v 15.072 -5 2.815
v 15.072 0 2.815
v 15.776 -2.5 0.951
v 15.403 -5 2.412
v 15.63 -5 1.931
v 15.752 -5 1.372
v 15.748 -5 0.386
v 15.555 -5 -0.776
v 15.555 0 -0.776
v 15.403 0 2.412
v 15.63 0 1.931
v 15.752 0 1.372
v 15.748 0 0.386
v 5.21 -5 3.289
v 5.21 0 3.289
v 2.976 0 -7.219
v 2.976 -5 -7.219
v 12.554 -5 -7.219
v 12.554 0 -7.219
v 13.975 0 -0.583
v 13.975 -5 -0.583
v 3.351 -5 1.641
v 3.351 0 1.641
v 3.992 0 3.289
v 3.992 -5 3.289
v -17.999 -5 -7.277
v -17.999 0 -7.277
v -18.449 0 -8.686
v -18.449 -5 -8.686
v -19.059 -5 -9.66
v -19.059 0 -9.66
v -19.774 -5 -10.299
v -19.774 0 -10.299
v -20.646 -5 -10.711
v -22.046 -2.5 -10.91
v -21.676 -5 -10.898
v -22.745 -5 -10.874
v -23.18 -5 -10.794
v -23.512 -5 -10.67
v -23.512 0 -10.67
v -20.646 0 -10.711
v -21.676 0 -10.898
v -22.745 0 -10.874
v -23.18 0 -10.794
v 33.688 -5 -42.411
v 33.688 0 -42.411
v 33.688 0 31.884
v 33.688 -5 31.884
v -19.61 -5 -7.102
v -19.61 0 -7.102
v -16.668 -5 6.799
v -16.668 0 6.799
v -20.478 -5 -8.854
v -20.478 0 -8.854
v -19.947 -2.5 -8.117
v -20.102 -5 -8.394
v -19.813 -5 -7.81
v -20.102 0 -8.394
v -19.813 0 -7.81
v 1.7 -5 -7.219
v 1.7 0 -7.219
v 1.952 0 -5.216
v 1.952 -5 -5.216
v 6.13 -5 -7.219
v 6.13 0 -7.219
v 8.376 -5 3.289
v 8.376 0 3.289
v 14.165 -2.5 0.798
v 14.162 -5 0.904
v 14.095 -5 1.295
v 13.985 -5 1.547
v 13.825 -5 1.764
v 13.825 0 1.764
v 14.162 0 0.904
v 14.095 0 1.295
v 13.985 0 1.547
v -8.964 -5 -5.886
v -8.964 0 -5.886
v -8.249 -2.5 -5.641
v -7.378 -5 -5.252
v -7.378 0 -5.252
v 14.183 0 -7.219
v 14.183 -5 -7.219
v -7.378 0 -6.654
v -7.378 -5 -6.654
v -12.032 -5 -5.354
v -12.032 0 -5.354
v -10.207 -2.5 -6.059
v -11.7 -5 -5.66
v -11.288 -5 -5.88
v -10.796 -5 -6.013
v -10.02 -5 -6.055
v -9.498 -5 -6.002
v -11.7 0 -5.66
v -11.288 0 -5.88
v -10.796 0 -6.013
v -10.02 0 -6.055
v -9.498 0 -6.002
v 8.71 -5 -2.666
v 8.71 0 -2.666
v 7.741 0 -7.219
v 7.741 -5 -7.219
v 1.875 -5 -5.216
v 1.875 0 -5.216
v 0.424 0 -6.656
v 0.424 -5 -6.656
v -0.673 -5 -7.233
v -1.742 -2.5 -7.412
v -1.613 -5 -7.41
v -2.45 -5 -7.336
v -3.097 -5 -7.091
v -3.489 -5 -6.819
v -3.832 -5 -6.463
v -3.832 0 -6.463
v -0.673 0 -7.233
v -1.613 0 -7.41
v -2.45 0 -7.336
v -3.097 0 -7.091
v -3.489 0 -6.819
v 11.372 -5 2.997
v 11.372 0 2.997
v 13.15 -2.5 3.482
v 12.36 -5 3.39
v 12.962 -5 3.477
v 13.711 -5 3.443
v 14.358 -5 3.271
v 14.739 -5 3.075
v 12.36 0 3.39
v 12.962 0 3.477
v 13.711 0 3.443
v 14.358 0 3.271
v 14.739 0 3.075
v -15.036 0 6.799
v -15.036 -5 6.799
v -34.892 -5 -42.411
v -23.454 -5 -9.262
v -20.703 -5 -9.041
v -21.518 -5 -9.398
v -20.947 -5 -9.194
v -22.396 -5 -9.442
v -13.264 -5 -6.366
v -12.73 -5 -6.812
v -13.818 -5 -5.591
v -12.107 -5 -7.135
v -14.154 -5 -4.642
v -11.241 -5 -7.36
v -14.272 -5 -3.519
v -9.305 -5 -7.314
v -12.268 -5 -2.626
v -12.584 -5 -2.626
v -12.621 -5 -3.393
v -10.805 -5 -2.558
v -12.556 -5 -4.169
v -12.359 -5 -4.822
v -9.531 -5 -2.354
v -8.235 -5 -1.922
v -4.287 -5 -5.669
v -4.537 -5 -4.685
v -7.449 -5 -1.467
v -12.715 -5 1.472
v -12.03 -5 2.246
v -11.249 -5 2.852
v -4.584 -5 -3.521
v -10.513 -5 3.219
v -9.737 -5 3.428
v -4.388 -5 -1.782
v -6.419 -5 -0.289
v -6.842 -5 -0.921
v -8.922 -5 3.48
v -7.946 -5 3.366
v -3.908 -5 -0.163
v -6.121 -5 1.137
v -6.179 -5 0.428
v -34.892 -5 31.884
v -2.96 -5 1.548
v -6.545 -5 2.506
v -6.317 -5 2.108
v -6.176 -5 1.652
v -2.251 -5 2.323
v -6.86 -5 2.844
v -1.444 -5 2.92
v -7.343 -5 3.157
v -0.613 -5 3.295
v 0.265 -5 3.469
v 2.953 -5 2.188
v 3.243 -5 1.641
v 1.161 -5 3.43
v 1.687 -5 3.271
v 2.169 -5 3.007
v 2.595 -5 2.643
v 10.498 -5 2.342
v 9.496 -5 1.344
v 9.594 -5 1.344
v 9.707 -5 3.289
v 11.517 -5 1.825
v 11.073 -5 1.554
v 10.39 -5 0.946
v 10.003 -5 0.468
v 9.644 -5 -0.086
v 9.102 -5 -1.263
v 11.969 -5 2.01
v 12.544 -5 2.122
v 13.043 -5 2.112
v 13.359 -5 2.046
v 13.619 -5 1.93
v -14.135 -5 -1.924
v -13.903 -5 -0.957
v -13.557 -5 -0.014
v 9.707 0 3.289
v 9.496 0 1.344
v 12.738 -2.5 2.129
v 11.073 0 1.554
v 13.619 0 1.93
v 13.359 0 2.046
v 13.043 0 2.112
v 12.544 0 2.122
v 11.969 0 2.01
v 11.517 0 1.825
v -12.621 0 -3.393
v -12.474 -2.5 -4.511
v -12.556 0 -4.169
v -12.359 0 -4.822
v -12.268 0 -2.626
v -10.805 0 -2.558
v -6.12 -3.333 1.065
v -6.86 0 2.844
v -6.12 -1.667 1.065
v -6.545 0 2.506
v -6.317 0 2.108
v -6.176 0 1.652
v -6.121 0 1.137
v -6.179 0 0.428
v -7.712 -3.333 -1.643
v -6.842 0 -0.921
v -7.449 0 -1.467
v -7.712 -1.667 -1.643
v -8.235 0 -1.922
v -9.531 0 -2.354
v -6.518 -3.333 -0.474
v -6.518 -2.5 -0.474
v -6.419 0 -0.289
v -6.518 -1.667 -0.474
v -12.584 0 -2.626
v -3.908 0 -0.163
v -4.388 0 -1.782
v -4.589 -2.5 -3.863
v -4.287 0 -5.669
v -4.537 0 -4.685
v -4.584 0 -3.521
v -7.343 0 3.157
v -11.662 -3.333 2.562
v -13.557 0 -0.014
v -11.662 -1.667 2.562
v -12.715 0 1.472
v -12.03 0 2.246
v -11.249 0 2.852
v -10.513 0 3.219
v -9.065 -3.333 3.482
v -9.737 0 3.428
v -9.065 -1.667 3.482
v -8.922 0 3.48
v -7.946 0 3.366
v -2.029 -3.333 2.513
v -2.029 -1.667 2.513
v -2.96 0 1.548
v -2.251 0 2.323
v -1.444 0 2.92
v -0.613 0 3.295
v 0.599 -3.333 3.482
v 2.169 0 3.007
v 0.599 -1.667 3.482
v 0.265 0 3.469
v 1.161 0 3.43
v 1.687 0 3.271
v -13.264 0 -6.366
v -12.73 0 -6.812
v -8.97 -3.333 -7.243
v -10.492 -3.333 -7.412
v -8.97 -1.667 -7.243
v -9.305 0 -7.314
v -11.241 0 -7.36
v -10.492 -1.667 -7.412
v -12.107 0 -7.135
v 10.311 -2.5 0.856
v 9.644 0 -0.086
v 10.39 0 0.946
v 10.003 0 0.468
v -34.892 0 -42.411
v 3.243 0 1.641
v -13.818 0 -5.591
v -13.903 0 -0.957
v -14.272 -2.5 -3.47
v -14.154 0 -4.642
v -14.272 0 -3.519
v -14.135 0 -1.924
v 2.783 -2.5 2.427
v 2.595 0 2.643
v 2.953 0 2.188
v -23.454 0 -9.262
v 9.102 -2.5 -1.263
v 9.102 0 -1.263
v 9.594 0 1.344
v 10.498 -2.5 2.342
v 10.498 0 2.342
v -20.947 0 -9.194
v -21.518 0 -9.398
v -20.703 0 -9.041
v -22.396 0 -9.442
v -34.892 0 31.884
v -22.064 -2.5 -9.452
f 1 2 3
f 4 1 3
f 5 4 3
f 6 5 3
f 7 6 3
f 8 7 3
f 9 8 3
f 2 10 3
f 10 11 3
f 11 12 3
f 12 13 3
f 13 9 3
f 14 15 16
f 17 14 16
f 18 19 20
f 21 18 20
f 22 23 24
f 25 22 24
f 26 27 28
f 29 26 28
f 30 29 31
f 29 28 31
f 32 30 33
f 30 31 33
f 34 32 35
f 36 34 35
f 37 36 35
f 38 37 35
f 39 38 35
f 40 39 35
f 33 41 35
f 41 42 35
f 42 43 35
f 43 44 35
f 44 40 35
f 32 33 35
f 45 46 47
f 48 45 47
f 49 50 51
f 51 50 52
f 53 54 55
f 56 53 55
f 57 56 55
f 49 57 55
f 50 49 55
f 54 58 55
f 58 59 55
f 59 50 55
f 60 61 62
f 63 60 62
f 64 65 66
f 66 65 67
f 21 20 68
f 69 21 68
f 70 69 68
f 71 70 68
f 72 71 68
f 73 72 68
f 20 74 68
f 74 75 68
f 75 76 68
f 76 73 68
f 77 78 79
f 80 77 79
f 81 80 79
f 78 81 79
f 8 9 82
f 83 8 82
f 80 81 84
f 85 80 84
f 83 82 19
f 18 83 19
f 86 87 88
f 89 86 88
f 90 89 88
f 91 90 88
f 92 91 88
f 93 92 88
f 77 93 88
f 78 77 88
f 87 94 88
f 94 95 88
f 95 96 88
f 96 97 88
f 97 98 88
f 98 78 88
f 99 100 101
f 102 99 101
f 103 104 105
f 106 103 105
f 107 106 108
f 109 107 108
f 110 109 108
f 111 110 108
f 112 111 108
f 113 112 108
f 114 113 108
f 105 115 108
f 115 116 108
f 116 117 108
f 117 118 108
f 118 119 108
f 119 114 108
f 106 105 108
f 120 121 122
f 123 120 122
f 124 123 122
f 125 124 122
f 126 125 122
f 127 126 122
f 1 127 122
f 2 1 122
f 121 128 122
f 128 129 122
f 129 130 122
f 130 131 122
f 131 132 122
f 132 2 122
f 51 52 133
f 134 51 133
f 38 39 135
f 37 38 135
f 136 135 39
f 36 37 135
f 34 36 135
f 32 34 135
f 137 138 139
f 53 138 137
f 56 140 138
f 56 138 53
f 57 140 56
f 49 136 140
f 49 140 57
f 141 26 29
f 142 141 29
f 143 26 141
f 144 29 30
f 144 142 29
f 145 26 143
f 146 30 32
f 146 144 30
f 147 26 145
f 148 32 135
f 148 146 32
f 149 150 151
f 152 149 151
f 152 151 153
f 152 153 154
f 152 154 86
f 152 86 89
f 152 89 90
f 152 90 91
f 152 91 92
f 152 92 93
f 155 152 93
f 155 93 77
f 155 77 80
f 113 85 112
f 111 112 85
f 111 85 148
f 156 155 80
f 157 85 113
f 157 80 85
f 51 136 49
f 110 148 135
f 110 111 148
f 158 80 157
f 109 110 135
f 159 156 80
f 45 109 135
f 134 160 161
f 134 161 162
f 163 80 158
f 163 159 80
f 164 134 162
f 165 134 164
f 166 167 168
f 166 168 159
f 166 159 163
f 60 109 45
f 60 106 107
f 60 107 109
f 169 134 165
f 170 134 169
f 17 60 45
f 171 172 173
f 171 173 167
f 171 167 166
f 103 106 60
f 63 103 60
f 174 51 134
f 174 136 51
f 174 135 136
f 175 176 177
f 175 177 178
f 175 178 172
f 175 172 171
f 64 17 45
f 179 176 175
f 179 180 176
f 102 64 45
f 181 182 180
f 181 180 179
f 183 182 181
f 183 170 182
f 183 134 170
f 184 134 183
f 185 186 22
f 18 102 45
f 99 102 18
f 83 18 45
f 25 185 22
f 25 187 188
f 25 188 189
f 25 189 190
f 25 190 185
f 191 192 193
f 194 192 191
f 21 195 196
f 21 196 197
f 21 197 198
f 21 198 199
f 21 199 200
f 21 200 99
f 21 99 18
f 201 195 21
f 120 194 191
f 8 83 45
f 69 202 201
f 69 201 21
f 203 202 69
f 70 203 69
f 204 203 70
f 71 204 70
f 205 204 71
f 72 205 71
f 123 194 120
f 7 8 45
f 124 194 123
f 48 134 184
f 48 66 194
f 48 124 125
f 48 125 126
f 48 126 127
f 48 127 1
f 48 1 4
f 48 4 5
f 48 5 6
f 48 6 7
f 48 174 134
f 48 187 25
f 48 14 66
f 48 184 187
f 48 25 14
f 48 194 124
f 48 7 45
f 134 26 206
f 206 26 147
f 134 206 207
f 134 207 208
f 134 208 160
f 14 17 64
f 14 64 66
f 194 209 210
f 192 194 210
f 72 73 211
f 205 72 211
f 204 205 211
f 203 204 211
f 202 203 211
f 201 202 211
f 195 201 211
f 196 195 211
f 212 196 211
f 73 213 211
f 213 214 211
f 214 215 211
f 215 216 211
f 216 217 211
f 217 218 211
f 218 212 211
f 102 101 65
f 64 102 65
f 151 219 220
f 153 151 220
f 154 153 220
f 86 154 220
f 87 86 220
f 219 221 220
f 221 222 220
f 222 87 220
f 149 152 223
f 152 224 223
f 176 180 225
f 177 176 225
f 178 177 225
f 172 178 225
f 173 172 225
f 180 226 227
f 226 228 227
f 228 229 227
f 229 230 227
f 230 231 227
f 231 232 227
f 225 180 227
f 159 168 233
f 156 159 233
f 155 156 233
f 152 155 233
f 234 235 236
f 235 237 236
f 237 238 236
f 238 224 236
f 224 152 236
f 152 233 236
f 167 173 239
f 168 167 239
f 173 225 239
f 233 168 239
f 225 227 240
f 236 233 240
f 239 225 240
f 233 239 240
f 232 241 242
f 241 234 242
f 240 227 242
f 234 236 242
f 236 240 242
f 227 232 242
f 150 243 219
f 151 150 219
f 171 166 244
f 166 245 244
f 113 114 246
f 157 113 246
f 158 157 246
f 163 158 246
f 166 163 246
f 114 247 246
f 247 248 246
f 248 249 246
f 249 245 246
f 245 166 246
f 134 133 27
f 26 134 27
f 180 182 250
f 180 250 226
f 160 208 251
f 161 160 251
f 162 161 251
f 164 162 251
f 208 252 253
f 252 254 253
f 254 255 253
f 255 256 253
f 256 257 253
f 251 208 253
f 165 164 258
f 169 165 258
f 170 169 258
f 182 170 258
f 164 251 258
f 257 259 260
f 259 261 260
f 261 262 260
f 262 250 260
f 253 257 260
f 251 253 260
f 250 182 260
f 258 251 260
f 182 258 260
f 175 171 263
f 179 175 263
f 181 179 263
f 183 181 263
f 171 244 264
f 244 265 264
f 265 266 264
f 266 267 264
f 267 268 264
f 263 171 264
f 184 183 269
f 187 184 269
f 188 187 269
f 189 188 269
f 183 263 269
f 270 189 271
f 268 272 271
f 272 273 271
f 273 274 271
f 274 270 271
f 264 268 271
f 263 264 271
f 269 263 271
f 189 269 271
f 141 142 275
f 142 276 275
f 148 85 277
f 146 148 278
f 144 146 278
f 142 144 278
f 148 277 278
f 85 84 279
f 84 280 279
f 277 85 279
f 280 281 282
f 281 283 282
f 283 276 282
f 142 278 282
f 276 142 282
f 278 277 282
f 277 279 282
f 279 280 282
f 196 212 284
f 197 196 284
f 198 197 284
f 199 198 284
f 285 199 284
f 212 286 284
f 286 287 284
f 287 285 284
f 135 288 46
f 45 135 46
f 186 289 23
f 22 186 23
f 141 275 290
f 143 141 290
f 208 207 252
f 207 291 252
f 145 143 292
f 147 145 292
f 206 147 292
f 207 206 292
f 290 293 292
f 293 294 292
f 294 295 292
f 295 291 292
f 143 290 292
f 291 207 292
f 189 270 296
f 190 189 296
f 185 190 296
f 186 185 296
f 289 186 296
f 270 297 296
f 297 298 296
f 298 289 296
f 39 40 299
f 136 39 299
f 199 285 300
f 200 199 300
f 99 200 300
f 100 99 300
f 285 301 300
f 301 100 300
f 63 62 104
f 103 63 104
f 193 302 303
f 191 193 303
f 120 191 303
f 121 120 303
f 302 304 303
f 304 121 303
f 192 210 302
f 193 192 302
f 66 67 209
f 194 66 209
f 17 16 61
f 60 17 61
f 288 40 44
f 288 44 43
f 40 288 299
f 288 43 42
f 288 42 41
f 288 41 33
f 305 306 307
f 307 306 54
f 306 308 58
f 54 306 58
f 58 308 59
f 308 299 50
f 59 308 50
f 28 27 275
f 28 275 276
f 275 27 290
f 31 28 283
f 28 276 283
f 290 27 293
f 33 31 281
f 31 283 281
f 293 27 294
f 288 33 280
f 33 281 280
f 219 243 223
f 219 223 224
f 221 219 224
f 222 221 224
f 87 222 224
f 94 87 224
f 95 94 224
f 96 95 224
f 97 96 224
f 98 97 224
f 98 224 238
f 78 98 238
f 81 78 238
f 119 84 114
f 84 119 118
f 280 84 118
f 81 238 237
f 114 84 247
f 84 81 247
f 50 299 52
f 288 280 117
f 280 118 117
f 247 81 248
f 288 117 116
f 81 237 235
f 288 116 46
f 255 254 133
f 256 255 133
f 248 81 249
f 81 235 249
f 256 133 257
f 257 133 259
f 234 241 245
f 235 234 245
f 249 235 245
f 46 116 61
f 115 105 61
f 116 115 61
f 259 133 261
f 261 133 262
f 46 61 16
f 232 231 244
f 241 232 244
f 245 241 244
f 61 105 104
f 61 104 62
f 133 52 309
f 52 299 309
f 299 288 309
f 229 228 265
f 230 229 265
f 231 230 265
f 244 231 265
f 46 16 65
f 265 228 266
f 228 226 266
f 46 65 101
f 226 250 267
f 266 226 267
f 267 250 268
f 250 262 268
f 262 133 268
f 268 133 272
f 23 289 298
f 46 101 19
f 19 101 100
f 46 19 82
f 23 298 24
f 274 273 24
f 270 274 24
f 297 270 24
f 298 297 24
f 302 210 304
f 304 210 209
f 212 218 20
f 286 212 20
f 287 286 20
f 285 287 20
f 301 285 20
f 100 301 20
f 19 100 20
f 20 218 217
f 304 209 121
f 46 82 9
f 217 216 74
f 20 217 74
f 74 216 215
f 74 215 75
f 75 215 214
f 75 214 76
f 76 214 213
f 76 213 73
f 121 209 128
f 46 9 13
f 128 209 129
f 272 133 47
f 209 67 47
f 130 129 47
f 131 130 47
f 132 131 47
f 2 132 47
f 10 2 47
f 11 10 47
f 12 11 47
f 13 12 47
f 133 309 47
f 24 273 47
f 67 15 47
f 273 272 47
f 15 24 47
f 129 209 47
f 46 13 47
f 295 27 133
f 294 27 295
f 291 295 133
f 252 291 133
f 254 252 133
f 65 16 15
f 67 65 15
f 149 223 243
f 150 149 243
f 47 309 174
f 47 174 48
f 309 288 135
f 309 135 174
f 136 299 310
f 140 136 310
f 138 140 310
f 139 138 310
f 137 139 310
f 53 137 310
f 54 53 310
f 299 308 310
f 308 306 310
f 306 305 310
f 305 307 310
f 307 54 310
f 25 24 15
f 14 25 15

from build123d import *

# Parameters (mm, degrees)
F0_W     = 68.5800015926
F0_H     = 74.2950029671
F1_DEPTH = 5


with BuildPart() as f1:
    # F0 (on Front) → F1 (new body)
    with BuildSketch(Plane.XZ):
        with Locations((-0.6015785038, -5.2638160996)):
            Rectangle(F0_W, F0_H)
        with BuildLine():
            add(Edge.make_bspline(
                [(-17.999325617, -7.2772391204), (-18.7571088854, -10.9096900915), (-22.0459496295, -10.9096900915)],
                knots=[0, 0, 0, 1, 1, 1], degree=2))
            add(Edge.make_bspline(
                [(-22.0459496295, -10.9096900915), (-23.0522367228, -10.9096900915), (-23.5124289911, -10.670390112)],
                knots=[0, 0, 0, 1, 1, 1], degree=2))
            Line((-23.5124289911, -10.670390112), (-23.4541379705, -9.262201771))
            add(Edge.make_bspline(
                [(-23.4541379705, -9.262201771), (-22.7945290526, -9.4524145752), (-22.0643573202, -9.4524145752)],
                knots=[0, 0, 0, 1, 1, 1], degree=2))
            add(Edge.make_bspline(
                [(-22.0643573202, -9.4524145752), (-21.1071574022, -9.4524145752), (-20.4782279689, -8.8541646264)],
                knots=[0, 0, 0, 1, 1, 1], degree=2))
            add(Edge.make_bspline(
                [(-20.4782279689, -8.8541646264), (-19.8492985355, -8.2559146776), (-19.609998556, -7.1023660585)],
                knots=[0, 0, 0, 1, 1, 1], degree=2))
            Line((-19.609998556, -7.1023660585), (-16.6678359874, 6.7985083924))
            Line((-16.6678359874, 6.7985083924), (-15.0356874092, 6.7985083924))
            Line((-15.0356874092, 6.7985083924), (-17.999325617, -7.2772391204))
        make_face(mode=Mode.SUBTRACT)
        with BuildLine():
            add(Edge.make_bspline(
                [(-8.9703533131, -7.2434916874), (-9.6606417155, -7.4122288524), (-10.4920557469, -7.4122288524)],
                knots=[0, 0, 0, 1, 1, 1], degree=2))
            add(Edge.make_bspline(
                [(-10.4920557469, -7.4122288524), (-12.2561261087, -7.4122288524), (-13.2639471763, -6.3660584292)],
                knots=[0, 0, 0, 1, 1, 1], degree=2))
            add(Edge.make_bspline(
                [(-13.2639471763, -6.3660584292), (-14.2717682438, -5.3198880059), (-14.2717682438, -3.4699150874)],
                knots=[0, 0, 0, 1, 1, 1], degree=2))
            add(Edge.make_bspline(
                [(-14.2717682438, -3.4699150874), (-14.2717682438, -1.6690293442), (-13.5569362537, -0.0138711525)],
                knots=[0, 0, 0, 1, 1, 1], degree=2))
            add(Edge.make_bspline(
                [(-13.5569362537, -0.0138711525), (-12.8421042637, 1.6412870391), (-11.6624780826, 2.5616715757)],
                knots=[0, 0, 0, 1, 1, 1], degree=2))
            add(Edge.make_bspline(
                [(-11.6624780826, 2.5616715757), (-10.4828519015, 3.4820561123), (-9.0654597152, 3.4820561123)],
                knots=[0, 0, 0, 1, 1, 1], degree=2))
            add(Edge.make_bspline(
                [(-9.0654597152, 3.4820561123), (-7.5989803536, 3.4820561123), (-6.8596047759, 2.8439228336)],
                knots=[0, 0, 0, 1, 1, 1], degree=2))
            add(Edge.make_bspline(
                [(-6.8596047759, 2.8439228336), (-6.1202291981, 2.2057895549), (-6.1202291981, 1.0645127295)],
                knots=[0, 0, 0, 1, 1, 1], degree=2))
            add(Edge.make_bspline(
                [(-6.1202291981, 1.0645127295), (-6.1202291981, -0.6596743024), (-7.7124944464, -1.6429517823)],
                knots=[0, 0, 0, 1, 1, 1], degree=2))
            add(Edge.make_bspline(
                [(-7.7124944464, -1.6429517823), (-9.3047596947, -2.6262292622), (-12.2683979025, -2.6262292622)],
                knots=[0, 0, 0, 1, 1, 1], degree=2))
            Line((-12.2683979025, -2.6262292622), (-12.5843965934, -2.6262292622))
            Line((-12.5843965934, -2.6262292622), (-12.6212119749, -3.393216376))
            add(Edge.make_bspline(
                [(-12.6212119749, -3.393216376), (-12.6212119749, -4.6480072942), (-12.0321658715, -5.353635439)],
                knots=[0, 0, 0, 1, 1, 1], degree=2))
            add(Edge.make_bspline(
                [(-12.0321658715, -5.353635439), (-11.443119768, -6.0592635837), (-10.2067365406, -6.0592635837)],
                knots=[0, 0, 0, 1, 1, 1], degree=2))
            add(Edge.make_bspline(
                [(-10.2067365406, -6.0592635837), (-9.6023506949, -6.0592635837), (-8.9642174162, -5.8859244959)],
                knots=[0, 0, 0, 1, 1, 1], degree=2))
            add(Edge.make_bspline(
                [(-8.9642174162, -5.8859244959), (-8.3260841375, -5.7125854082), (-7.3780880648, -5.2523931399)],
                knots=[0, 0, 0, 1, 1, 1], degree=2))
            Line((-7.3780880648, -5.2523931399), (-7.3780880648, -6.654445584))
            add(Edge.make_bspline(
                [(-7.3780880648, -6.654445584), (-8.2800649107, -7.0747545224), (-8.9703533131, -7.2434916874)],
                knots=[0, 0, 0, 1, 1, 1], degree=2))
        make_face(mode=Mode.SUBTRACT)
        with BuildLine():
            add(Edge.make_bspline(
                [(-2.029119933, 2.5125844004), (-0.8310860612, 3.4820561123), (0.5985779189, 3.4820561123)],
                knots=[0, 0, 0, 1, 1, 1], degree=2))
            add(Edge.make_bspline(
                [(0.5985779189, 3.4820561123), (1.4790791256, 3.4820561123), (2.169367528, 3.0065241017)],
                knots=[0, 0, 0, 1, 1, 1], degree=2))
            add(Edge.make_bspline(
                [(2.169367528, 3.0065241017), (2.8596559305, 2.5309920911), (3.2431494874, 1.6412870391)],
                knots=[0, 0, 0, 1, 1, 1], degree=2))
            Line((3.2431494874, 1.6412870391), (3.3505276833, 1.6412870391))
            Line((3.3505276833, 1.6412870391), (3.9917289105, 3.2887753596))
            Line((3.9917289105, 3.2887753596), (5.2097044472, 3.2887753596))
            Line((5.2097044472, 3.2887753596), (2.9762379718, -7.2189480998))
            Line((2.9762379718, -7.2189480998), (1.6999714144, -7.2189480998))
            Line((1.6999714144, -7.2189480998), (1.9515431877, -5.2155777585))
            Line((1.9515431877, -5.2155777585), (1.8748444763, -5.2155777585))
            add(Edge.make_bspline(
                [(1.8748444763, -5.2155777585), (0.1567933414, -7.4122288524), (-1.7422667524, -7.4122288524)],
                knots=[0, 0, 0, 1, 1, 1], degree=2))
            add(Edge.make_bspline(
                [(-1.7422667524, -7.4122288524), (-3.073756382, -7.4122288524), (-3.8315396505, -6.4626988055)],
                knots=[0, 0, 0, 1, 1, 1], degree=2))
            add(Edge.make_bspline(
                [(-3.8315396505, -6.4626988055), (-4.5893229189, -5.5131687586), (-4.5893229189, -3.8626124897)],
                knots=[0, 0, 0, 1, 1, 1], degree=2))
            add(Edge.make_bspline(
                [(-4.5893229189, -3.8626124897), (-4.5893229189, -1.8684459938), (-3.9082383619, -0.1626666526)],
                knots=[0, 0, 0, 1, 1, 1], degree=2))
            add(Edge.make_bspline(
                [(-3.9082383619, -0.1626666526), (-3.2271538048, 1.5431126885), (-2.029119933, 2.5125844004)],
                knots=[0, 0, 0, 1, 1, 1], degree=2))
        make_face(mode=Mode.SUBTRACT)
        with BuildLine():
            Line((14.1834536789, -7.2189480998), (12.5543730492, -7.2189480998))
            Line((12.5543730492, -7.2189480998), (13.974833184, -0.582975591))
            add(Edge.make_bspline(
                [(13.974833184, -0.582975591), (14.1650459882, 0.414107657), (14.1650459882, 0.7976012139)],
                knots=[0, 0, 0, 1, 1, 1], degree=2))
            add(Edge.make_bspline(
                [(14.1650459882, 0.7976012139), (14.1650459882, 1.3989191111), (13.8245037097, 1.7640049773)],
                knots=[0, 0, 0, 1, 1, 1], degree=2))
            add(Edge.make_bspline(
                [(13.8245037097, 1.7640049773), (13.4839614311, 2.1290908435), (12.7384499565, 2.1290908435)],
                knots=[0, 0, 0, 1, 1, 1], degree=2))
            add(Edge.make_bspline(
                [(12.7384499565, 2.1290908435), (11.8824923375, 2.1290908435), (11.0725539453, 1.5538505081)],
                knots=[0, 0, 0, 1, 1, 1], degree=2))
            add(Edge.make_bspline(
                [(11.0725539453, 1.5538505081), (10.2626155531, 0.9786101728), (9.6444239393, -0.0859679412)],
                knots=[0, 0, 0, 1, 1, 1], degree=2))
            add(Edge.make_bspline(
                [(9.6444239393, -0.0859679412), (9.0262323256, -1.1505460552), (8.7102336347, -2.6661125921)],
                knots=[0, 0, 0, 1, 1, 1], degree=2))
            Line((8.7102336347, -2.6661125921), (7.7407619228, -7.2189480998))
            Line((7.7407619228, -7.2189480998), (6.1300889838, -7.2189480998))
            Line((6.1300889838, -7.2189480998), (8.3758272531, 3.2887753596))
            Line((8.3758272531, 3.2887753596), (9.7073168827, 3.2887753596))
            Line((9.7073168827, 3.2887753596), (9.4956284393, 1.3436960389))
            Line((9.4956284393, 1.3436960389), (9.5938027898, 1.3436960389))
            add(Edge.make_bspline(
                [(9.5938027898, 1.3436960389), (10.5141873264, 2.5125844004), (11.3716789197, 2.9973202563)],
                knots=[0, 0, 0, 1, 1, 1], degree=2))
            add(Edge.make_bspline(
                [(11.3716789197, 2.9973202563), (12.2291705129, 3.4820561123), (13.1495550495, 3.4820561123)],
                knots=[0, 0, 0, 1, 1, 1], degree=2))
            add(Edge.make_bspline(
                [(13.1495550495, 3.4820561123), (14.3675305862, 3.4820561123), (15.0716247567, 2.8147773232)],
                knots=[0, 0, 0, 1, 1, 1], degree=2))
            add(Edge.make_bspline(
                [(15.0716247567, 2.8147773232), (15.7757189272, 2.1474985342), (15.7757189272, 0.9509986367)],
                knots=[0, 0, 0, 1, 1, 1], degree=2))
            add(Edge.make_bspline(
                [(15.7757189272, 0.9509986367), (15.7757189272, 0.1932153682), (15.5548266384, -0.7762563437)],
                knots=[0, 0, 0, 1, 1, 1], degree=2))
            Line((15.5548266384, -0.7762563437), (14.1834536789, -7.2189480998))
        make_face(mode=Mode.SUBTRACT)
    extrude(amount=F1_DEPTH)


solid = f1.part
